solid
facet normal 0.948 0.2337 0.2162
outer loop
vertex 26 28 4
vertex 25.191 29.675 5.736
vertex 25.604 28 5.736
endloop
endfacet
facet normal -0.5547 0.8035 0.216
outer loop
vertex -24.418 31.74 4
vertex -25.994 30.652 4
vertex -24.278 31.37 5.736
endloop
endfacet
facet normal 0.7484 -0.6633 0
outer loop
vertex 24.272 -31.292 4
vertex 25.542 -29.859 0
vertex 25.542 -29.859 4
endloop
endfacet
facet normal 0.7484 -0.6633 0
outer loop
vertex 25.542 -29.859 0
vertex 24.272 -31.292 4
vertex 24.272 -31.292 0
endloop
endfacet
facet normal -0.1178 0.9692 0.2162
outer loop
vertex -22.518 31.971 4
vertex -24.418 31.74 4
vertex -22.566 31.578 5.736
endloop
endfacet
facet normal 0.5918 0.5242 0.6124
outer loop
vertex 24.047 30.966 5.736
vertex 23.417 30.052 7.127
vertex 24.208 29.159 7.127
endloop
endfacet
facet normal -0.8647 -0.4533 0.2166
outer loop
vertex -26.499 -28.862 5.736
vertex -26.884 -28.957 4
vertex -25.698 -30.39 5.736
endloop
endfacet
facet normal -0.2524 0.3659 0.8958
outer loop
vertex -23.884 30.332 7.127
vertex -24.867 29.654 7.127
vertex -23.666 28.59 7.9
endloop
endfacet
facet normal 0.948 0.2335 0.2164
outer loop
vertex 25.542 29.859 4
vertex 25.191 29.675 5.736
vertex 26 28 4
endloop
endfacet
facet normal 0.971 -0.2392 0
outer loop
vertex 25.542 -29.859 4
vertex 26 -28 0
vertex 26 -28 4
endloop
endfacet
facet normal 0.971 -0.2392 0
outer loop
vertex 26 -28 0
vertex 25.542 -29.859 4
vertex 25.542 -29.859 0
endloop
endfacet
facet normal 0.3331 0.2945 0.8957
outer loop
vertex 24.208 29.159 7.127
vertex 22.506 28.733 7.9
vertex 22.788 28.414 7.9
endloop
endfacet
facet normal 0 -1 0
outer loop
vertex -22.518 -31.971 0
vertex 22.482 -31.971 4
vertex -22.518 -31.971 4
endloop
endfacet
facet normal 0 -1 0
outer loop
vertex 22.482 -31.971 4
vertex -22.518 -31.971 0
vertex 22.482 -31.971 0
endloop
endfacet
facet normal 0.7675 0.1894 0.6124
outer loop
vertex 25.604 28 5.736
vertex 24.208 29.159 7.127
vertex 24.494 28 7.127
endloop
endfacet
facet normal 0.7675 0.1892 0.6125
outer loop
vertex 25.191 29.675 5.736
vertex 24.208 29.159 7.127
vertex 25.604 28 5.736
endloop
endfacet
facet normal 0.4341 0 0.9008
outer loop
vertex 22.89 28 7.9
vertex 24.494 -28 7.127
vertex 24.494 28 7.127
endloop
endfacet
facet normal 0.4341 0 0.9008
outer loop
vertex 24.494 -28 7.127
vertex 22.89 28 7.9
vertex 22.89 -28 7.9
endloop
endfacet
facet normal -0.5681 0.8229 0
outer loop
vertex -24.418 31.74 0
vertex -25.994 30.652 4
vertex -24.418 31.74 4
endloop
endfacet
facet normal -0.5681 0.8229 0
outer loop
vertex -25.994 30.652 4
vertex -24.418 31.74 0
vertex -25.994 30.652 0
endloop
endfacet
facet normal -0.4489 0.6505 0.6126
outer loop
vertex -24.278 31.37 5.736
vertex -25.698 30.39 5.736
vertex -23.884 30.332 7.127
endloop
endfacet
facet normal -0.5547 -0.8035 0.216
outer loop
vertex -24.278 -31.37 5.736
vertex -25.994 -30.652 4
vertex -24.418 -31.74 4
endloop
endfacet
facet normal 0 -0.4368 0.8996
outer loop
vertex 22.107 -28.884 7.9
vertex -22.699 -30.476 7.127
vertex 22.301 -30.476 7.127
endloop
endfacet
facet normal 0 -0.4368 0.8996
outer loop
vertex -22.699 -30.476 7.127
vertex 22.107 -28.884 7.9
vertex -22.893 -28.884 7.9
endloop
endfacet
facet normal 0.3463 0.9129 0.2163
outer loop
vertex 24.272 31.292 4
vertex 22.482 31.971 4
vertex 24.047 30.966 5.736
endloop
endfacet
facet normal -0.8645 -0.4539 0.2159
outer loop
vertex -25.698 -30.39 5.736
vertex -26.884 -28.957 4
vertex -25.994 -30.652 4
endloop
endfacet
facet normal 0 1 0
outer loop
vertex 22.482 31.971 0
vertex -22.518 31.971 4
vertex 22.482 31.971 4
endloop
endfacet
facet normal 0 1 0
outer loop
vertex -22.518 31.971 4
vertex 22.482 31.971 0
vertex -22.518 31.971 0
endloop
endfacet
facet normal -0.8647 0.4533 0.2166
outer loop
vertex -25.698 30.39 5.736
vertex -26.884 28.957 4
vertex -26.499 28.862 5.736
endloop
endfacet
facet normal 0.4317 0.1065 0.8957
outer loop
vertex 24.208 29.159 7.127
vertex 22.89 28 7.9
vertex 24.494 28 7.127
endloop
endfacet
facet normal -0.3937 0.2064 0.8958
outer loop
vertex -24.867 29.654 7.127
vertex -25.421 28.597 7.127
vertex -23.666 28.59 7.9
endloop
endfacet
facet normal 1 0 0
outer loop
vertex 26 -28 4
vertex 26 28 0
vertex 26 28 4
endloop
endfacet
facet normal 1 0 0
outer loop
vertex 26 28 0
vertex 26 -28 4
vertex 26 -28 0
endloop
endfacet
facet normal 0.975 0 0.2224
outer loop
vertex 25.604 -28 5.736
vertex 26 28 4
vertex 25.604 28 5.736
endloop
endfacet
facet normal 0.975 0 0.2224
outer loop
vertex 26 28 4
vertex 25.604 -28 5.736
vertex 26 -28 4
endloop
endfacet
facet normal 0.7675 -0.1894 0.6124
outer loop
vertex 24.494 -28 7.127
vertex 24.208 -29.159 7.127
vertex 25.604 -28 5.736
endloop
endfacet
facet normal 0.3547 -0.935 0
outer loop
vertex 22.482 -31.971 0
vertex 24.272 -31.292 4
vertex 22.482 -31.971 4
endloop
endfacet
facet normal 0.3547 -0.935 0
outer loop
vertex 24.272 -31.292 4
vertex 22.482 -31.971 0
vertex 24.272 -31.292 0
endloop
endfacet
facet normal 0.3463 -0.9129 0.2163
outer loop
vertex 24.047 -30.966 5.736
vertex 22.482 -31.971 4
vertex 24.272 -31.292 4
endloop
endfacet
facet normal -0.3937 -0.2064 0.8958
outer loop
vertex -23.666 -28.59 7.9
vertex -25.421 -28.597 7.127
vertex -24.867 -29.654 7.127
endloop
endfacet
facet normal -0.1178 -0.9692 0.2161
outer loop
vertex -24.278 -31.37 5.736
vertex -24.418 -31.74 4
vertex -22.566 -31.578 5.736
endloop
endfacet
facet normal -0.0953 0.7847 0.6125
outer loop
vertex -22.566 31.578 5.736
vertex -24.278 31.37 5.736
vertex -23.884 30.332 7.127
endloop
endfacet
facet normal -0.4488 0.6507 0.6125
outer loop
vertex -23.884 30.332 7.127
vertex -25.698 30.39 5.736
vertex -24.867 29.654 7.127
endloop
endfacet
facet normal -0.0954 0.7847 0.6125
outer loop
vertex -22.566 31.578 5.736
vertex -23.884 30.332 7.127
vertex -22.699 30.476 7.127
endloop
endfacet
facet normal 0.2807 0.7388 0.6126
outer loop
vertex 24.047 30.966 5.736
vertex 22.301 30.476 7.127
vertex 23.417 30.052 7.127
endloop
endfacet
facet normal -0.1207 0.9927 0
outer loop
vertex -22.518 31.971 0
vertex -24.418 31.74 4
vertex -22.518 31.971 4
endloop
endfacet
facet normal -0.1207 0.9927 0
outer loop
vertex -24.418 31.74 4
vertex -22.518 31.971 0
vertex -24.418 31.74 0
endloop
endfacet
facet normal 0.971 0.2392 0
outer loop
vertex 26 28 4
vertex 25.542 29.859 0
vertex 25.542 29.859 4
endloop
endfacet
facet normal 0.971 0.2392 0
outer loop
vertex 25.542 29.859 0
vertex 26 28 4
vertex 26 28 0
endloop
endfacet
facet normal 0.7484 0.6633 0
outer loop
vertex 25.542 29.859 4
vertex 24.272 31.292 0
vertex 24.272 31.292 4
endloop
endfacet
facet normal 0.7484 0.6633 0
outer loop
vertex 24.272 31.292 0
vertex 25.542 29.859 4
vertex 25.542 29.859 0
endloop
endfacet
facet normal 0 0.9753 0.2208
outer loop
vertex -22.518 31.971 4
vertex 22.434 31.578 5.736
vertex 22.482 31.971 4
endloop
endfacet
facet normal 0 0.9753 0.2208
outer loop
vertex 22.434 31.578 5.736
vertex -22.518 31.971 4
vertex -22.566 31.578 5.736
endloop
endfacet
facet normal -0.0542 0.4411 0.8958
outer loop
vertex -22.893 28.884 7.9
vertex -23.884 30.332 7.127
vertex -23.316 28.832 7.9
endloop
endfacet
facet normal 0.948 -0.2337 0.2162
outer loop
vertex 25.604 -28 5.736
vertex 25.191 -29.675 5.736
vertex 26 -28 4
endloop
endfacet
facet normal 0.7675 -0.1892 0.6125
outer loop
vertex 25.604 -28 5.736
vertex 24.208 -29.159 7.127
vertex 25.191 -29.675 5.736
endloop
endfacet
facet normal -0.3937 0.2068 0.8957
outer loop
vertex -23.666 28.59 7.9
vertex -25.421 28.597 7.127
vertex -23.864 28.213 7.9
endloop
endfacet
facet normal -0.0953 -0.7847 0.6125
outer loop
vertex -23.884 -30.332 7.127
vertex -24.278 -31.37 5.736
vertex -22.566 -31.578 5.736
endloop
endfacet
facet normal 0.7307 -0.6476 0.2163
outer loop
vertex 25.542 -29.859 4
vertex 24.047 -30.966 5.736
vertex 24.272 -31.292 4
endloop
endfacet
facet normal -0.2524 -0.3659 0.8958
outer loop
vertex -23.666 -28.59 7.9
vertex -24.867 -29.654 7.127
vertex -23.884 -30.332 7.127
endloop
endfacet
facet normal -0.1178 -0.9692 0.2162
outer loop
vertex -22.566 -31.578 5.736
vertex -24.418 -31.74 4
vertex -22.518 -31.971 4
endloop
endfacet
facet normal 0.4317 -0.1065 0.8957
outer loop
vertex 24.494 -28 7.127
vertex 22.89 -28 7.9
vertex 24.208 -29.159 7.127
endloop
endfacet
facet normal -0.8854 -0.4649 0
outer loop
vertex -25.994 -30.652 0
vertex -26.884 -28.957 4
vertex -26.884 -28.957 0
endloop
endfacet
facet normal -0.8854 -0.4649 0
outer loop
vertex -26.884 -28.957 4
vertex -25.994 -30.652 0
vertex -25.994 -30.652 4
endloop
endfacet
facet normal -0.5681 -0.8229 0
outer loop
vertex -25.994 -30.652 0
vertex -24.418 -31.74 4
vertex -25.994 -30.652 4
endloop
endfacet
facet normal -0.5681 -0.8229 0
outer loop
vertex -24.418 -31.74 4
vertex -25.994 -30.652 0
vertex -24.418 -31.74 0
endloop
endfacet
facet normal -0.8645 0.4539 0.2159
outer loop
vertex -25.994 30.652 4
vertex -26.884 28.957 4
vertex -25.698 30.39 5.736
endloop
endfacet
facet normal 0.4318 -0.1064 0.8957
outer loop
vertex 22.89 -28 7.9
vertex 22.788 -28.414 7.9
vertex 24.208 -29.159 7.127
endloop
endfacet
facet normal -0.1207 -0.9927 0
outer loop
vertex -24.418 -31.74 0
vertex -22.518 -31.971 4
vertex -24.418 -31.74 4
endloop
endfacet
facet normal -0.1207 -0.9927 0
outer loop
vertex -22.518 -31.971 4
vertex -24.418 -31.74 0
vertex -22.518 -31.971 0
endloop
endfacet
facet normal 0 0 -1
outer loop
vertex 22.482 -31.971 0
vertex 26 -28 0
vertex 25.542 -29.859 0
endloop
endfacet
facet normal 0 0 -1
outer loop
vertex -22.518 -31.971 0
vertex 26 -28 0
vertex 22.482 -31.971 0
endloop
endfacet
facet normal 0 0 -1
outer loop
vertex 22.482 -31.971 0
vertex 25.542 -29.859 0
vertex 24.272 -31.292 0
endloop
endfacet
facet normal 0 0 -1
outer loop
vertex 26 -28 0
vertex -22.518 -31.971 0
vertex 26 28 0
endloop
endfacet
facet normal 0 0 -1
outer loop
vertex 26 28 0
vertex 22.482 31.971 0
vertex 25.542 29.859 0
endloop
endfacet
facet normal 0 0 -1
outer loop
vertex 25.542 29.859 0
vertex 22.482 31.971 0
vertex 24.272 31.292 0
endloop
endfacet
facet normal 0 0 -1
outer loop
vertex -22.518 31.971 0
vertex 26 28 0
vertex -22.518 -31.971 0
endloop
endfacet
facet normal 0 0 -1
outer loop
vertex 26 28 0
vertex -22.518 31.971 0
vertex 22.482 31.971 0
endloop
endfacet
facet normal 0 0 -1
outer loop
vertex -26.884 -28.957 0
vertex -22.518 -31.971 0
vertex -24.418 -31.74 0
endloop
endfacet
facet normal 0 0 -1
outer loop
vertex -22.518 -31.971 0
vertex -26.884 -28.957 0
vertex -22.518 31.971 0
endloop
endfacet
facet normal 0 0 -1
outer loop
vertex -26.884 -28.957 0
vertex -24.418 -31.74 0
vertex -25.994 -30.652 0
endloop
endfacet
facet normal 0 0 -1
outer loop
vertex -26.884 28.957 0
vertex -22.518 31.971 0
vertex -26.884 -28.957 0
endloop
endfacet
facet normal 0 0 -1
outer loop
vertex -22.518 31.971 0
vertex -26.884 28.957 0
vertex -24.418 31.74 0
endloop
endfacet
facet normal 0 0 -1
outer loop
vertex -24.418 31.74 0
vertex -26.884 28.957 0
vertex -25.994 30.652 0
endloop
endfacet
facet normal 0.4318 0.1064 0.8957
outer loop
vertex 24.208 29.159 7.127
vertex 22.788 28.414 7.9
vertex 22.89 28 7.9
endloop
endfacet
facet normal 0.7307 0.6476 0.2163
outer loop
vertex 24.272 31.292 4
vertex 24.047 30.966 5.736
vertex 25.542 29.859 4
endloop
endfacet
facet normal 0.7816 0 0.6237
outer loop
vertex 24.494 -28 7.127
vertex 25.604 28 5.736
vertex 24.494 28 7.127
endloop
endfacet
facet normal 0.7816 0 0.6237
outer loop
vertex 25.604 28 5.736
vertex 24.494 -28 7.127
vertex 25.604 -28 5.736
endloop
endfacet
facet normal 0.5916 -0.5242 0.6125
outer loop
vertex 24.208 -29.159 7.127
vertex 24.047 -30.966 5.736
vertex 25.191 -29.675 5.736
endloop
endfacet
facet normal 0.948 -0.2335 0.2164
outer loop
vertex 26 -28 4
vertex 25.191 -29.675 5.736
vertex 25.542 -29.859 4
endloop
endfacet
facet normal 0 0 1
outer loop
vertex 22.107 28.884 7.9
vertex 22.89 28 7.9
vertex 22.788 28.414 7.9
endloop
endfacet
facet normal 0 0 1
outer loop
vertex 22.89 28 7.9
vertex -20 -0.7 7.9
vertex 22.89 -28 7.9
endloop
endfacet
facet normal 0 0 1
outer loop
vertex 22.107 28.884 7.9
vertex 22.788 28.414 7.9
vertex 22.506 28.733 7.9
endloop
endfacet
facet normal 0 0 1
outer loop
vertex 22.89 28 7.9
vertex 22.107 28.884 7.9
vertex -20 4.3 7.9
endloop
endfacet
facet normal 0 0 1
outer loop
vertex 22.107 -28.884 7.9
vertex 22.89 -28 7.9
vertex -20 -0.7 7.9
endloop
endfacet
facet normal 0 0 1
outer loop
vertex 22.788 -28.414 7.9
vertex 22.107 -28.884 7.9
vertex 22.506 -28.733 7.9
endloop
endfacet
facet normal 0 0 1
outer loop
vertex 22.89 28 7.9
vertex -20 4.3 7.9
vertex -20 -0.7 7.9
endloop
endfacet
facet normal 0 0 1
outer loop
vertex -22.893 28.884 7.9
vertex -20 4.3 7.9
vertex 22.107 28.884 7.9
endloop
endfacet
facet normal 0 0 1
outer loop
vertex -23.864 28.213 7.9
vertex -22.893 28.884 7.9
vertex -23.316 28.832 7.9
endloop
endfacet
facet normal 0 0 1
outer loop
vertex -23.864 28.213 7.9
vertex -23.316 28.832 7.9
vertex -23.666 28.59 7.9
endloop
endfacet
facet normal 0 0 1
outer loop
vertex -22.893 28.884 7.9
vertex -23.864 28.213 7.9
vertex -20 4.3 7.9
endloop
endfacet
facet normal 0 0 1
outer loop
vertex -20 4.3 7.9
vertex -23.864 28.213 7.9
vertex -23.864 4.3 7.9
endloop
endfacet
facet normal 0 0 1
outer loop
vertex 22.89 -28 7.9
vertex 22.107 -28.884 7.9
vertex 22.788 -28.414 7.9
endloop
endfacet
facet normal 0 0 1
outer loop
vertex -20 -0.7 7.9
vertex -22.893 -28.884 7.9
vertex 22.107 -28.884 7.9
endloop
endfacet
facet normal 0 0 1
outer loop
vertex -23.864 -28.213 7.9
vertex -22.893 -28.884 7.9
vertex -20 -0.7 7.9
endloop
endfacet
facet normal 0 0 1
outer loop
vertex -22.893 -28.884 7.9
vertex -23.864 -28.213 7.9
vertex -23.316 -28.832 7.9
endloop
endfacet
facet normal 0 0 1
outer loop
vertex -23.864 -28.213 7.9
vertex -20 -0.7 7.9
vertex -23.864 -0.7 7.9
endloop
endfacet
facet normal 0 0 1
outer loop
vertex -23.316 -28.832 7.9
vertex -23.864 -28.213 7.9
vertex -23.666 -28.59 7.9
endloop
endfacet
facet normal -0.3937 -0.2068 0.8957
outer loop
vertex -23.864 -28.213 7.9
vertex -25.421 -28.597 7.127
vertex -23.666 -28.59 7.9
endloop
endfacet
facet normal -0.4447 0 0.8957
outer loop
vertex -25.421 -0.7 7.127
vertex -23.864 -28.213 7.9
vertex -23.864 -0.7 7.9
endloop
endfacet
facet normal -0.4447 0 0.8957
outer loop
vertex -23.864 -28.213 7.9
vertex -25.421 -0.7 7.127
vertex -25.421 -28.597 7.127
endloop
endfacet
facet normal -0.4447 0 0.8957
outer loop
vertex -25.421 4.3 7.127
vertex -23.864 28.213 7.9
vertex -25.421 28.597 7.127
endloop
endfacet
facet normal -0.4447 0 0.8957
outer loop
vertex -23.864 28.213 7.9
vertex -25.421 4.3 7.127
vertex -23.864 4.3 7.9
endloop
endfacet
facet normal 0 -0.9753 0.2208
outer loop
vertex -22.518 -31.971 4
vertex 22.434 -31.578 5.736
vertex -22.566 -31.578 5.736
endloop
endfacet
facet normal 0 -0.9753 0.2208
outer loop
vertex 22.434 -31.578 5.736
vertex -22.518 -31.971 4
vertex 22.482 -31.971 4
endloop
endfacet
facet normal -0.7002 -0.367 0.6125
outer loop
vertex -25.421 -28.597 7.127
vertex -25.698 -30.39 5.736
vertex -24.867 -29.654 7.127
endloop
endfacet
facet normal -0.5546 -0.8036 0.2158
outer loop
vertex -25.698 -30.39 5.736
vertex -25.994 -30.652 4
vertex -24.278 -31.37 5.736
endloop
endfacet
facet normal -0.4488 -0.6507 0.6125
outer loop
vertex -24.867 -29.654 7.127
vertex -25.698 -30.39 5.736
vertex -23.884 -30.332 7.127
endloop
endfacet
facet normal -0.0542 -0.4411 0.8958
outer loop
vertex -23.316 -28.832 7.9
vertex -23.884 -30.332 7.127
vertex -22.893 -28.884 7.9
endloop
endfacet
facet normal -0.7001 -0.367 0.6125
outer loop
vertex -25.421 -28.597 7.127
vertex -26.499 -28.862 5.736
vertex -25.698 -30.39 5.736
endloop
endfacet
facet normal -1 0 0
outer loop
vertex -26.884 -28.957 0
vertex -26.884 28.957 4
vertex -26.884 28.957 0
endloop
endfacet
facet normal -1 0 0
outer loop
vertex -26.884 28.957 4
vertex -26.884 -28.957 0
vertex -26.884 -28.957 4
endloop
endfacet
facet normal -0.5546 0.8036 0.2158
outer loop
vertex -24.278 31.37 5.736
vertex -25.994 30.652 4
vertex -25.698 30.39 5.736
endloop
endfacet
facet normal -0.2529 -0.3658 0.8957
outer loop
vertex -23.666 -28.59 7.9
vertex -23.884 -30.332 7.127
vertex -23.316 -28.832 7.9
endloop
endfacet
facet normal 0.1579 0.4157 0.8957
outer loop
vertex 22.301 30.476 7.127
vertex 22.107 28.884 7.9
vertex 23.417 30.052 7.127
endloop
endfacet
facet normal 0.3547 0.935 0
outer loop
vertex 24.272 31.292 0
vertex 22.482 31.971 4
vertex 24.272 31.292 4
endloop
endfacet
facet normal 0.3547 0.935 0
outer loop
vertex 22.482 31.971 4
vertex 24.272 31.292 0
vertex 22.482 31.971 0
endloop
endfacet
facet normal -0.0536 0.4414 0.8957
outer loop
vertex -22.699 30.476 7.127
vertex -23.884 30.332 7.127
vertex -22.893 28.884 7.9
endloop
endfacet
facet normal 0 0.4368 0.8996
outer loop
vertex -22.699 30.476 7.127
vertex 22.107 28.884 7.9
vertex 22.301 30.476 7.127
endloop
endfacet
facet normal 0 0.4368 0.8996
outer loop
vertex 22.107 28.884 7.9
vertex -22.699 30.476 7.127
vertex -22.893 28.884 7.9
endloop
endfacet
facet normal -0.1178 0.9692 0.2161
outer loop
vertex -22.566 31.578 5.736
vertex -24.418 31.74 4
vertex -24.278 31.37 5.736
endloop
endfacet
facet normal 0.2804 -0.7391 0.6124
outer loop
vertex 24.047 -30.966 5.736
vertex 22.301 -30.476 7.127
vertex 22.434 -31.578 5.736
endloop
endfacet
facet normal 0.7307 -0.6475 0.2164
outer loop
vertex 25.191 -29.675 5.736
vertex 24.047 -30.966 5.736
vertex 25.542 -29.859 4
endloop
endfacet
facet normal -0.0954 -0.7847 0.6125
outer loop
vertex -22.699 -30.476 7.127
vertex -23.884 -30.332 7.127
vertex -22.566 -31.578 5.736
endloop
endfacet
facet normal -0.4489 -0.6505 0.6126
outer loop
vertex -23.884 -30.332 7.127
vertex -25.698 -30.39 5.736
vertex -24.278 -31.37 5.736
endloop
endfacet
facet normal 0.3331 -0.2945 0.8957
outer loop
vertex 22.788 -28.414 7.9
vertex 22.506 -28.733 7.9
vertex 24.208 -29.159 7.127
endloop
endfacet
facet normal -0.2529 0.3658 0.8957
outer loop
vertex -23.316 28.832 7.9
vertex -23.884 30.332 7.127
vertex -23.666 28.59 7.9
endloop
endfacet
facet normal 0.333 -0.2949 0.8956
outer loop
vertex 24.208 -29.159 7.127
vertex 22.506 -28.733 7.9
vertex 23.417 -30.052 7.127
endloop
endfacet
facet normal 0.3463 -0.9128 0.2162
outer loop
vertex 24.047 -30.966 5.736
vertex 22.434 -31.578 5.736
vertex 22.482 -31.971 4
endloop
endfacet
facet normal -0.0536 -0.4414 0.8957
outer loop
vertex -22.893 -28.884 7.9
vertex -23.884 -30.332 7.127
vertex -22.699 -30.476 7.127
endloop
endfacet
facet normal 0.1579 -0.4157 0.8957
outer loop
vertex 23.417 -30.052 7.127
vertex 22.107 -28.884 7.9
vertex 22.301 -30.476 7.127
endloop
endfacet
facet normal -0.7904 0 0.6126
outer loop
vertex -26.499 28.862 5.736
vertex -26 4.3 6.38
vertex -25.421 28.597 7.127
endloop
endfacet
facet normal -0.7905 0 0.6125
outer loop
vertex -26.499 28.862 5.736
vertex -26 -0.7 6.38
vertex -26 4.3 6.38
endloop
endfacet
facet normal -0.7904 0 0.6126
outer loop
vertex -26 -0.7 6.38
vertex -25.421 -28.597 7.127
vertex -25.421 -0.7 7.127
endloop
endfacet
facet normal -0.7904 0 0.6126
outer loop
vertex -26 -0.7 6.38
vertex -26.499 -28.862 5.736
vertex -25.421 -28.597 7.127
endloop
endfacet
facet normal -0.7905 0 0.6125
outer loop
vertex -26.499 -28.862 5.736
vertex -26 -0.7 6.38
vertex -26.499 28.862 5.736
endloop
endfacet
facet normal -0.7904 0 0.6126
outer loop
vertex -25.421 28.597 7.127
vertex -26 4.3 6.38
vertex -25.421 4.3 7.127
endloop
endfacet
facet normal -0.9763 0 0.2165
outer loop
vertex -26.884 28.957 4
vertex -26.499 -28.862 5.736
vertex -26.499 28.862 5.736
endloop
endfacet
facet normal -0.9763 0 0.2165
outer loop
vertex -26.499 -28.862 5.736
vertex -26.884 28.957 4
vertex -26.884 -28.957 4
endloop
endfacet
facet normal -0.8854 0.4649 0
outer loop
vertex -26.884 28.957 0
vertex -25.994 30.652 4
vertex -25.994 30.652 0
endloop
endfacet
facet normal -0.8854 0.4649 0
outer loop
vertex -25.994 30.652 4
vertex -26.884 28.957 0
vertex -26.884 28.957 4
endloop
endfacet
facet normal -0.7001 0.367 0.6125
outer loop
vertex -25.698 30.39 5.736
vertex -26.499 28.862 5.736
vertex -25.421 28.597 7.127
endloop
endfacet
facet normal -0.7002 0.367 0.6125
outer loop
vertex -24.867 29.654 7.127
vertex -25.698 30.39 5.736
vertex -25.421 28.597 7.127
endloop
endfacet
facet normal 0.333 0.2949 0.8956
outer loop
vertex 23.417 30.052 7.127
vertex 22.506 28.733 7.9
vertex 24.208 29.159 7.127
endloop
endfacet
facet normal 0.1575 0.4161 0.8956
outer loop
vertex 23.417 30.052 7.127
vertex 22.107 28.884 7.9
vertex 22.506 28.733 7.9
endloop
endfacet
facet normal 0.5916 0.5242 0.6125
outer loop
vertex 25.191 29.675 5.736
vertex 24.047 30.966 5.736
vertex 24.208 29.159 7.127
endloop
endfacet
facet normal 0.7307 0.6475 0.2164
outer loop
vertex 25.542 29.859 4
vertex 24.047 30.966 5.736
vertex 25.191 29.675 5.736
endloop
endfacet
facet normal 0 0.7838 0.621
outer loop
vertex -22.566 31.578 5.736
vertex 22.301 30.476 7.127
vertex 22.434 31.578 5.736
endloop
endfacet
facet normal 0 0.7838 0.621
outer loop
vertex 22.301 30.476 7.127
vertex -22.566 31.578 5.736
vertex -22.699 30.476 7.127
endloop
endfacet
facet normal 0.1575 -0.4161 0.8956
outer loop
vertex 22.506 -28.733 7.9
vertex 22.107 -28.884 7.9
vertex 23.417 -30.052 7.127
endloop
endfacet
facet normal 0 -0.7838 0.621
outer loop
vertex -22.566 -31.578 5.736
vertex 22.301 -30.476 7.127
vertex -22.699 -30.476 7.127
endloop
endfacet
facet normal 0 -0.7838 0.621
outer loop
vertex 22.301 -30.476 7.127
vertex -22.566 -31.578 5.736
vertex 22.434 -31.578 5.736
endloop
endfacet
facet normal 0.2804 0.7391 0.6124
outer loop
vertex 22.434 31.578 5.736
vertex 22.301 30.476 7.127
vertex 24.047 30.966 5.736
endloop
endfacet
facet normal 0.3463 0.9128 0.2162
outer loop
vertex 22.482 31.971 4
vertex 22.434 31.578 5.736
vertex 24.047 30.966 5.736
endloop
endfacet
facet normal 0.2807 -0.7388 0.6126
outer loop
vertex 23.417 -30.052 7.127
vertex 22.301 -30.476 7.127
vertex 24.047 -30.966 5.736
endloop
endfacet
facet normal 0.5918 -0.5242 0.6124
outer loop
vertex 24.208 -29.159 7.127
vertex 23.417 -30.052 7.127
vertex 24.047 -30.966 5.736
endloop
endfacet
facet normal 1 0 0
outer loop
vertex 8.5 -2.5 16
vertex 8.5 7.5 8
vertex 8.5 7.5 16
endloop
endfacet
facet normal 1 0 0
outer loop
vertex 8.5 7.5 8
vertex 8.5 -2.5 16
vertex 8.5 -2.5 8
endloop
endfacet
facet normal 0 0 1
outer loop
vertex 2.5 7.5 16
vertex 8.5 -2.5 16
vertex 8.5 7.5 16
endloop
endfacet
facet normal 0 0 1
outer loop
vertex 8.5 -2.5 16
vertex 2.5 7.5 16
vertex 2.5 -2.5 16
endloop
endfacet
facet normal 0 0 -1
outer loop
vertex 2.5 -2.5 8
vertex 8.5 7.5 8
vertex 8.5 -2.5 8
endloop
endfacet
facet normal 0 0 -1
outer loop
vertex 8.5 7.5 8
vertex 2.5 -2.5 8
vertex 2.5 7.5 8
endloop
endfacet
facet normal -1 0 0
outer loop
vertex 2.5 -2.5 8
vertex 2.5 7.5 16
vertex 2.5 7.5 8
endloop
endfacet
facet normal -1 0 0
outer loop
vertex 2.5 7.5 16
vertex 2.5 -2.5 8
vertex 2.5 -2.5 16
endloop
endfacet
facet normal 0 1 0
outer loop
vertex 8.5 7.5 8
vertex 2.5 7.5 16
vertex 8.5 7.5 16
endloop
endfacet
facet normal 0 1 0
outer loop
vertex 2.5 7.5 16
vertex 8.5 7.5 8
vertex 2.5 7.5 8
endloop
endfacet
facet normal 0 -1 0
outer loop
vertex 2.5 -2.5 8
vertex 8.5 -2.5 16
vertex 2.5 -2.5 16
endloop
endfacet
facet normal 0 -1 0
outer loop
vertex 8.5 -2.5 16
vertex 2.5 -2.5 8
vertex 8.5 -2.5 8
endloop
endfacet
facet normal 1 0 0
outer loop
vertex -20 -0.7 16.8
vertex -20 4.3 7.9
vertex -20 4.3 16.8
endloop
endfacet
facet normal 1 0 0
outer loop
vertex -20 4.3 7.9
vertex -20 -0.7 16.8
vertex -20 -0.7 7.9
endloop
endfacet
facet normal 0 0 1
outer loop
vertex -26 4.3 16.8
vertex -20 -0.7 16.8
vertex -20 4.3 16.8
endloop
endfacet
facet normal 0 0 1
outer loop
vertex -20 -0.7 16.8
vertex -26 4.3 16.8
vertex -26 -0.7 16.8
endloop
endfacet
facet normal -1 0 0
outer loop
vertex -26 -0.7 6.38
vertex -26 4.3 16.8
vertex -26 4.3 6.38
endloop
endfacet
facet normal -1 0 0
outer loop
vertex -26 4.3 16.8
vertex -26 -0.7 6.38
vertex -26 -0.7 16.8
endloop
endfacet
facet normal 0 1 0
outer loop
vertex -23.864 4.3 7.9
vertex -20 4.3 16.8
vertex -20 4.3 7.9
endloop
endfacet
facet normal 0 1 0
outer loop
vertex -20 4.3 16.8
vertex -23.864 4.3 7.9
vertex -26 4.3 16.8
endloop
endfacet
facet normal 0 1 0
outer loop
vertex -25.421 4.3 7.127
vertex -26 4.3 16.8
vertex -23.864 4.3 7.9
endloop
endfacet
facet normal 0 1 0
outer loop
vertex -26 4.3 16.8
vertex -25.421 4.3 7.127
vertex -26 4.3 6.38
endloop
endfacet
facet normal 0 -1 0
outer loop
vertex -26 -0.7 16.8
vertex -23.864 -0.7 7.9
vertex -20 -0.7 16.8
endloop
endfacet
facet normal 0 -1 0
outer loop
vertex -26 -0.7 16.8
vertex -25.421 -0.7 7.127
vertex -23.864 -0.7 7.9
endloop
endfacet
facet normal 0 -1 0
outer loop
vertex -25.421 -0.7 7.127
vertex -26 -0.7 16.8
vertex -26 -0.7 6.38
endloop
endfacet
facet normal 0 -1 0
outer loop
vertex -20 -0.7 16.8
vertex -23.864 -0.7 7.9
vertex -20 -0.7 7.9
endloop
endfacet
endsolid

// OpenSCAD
cubo_X = 45;
cubo_Y = 28;
cubo_Z = 4;
cubo_Radio = 4;

pieza1X = 6;
pieza1Y = 10;
pieza1Z = 8;

pieza2X = pieza1X;
pieza2Y = pieza1Y/2;
pieza2Z = pieza1Z * 3/5;

module crearCubo() {
    hull() {
    for (i=[0:3])
        translate([(i % 2) * cubo_X, (i - i % 2) * cubo_Y, 0]) {
            cylinder(r=cubo_Radio, h=1);
            translate([0, 0, cubo_Z])
                sphere(cubo_Radio);
        }
    }
}

module crearPieza1() {

    translate([cubo_X/2 + 3, cubo_X/2 + 3, cubo_Z + cubo_Radio])
    cube([pieza1X, pieza1Y, pieza1Z]);
}

module crearPieza2() {
    translate([-3, cubo_X/2 + pieza2Z , cubo_Z])
    cube([pieza2X, pieza2Y, pieza2Z + 2 * cubo_Z]);
}

translate([-23, -28, 0])
union() {
    crearCubo();
    crearPieza1();
    crearPieza2();
}
